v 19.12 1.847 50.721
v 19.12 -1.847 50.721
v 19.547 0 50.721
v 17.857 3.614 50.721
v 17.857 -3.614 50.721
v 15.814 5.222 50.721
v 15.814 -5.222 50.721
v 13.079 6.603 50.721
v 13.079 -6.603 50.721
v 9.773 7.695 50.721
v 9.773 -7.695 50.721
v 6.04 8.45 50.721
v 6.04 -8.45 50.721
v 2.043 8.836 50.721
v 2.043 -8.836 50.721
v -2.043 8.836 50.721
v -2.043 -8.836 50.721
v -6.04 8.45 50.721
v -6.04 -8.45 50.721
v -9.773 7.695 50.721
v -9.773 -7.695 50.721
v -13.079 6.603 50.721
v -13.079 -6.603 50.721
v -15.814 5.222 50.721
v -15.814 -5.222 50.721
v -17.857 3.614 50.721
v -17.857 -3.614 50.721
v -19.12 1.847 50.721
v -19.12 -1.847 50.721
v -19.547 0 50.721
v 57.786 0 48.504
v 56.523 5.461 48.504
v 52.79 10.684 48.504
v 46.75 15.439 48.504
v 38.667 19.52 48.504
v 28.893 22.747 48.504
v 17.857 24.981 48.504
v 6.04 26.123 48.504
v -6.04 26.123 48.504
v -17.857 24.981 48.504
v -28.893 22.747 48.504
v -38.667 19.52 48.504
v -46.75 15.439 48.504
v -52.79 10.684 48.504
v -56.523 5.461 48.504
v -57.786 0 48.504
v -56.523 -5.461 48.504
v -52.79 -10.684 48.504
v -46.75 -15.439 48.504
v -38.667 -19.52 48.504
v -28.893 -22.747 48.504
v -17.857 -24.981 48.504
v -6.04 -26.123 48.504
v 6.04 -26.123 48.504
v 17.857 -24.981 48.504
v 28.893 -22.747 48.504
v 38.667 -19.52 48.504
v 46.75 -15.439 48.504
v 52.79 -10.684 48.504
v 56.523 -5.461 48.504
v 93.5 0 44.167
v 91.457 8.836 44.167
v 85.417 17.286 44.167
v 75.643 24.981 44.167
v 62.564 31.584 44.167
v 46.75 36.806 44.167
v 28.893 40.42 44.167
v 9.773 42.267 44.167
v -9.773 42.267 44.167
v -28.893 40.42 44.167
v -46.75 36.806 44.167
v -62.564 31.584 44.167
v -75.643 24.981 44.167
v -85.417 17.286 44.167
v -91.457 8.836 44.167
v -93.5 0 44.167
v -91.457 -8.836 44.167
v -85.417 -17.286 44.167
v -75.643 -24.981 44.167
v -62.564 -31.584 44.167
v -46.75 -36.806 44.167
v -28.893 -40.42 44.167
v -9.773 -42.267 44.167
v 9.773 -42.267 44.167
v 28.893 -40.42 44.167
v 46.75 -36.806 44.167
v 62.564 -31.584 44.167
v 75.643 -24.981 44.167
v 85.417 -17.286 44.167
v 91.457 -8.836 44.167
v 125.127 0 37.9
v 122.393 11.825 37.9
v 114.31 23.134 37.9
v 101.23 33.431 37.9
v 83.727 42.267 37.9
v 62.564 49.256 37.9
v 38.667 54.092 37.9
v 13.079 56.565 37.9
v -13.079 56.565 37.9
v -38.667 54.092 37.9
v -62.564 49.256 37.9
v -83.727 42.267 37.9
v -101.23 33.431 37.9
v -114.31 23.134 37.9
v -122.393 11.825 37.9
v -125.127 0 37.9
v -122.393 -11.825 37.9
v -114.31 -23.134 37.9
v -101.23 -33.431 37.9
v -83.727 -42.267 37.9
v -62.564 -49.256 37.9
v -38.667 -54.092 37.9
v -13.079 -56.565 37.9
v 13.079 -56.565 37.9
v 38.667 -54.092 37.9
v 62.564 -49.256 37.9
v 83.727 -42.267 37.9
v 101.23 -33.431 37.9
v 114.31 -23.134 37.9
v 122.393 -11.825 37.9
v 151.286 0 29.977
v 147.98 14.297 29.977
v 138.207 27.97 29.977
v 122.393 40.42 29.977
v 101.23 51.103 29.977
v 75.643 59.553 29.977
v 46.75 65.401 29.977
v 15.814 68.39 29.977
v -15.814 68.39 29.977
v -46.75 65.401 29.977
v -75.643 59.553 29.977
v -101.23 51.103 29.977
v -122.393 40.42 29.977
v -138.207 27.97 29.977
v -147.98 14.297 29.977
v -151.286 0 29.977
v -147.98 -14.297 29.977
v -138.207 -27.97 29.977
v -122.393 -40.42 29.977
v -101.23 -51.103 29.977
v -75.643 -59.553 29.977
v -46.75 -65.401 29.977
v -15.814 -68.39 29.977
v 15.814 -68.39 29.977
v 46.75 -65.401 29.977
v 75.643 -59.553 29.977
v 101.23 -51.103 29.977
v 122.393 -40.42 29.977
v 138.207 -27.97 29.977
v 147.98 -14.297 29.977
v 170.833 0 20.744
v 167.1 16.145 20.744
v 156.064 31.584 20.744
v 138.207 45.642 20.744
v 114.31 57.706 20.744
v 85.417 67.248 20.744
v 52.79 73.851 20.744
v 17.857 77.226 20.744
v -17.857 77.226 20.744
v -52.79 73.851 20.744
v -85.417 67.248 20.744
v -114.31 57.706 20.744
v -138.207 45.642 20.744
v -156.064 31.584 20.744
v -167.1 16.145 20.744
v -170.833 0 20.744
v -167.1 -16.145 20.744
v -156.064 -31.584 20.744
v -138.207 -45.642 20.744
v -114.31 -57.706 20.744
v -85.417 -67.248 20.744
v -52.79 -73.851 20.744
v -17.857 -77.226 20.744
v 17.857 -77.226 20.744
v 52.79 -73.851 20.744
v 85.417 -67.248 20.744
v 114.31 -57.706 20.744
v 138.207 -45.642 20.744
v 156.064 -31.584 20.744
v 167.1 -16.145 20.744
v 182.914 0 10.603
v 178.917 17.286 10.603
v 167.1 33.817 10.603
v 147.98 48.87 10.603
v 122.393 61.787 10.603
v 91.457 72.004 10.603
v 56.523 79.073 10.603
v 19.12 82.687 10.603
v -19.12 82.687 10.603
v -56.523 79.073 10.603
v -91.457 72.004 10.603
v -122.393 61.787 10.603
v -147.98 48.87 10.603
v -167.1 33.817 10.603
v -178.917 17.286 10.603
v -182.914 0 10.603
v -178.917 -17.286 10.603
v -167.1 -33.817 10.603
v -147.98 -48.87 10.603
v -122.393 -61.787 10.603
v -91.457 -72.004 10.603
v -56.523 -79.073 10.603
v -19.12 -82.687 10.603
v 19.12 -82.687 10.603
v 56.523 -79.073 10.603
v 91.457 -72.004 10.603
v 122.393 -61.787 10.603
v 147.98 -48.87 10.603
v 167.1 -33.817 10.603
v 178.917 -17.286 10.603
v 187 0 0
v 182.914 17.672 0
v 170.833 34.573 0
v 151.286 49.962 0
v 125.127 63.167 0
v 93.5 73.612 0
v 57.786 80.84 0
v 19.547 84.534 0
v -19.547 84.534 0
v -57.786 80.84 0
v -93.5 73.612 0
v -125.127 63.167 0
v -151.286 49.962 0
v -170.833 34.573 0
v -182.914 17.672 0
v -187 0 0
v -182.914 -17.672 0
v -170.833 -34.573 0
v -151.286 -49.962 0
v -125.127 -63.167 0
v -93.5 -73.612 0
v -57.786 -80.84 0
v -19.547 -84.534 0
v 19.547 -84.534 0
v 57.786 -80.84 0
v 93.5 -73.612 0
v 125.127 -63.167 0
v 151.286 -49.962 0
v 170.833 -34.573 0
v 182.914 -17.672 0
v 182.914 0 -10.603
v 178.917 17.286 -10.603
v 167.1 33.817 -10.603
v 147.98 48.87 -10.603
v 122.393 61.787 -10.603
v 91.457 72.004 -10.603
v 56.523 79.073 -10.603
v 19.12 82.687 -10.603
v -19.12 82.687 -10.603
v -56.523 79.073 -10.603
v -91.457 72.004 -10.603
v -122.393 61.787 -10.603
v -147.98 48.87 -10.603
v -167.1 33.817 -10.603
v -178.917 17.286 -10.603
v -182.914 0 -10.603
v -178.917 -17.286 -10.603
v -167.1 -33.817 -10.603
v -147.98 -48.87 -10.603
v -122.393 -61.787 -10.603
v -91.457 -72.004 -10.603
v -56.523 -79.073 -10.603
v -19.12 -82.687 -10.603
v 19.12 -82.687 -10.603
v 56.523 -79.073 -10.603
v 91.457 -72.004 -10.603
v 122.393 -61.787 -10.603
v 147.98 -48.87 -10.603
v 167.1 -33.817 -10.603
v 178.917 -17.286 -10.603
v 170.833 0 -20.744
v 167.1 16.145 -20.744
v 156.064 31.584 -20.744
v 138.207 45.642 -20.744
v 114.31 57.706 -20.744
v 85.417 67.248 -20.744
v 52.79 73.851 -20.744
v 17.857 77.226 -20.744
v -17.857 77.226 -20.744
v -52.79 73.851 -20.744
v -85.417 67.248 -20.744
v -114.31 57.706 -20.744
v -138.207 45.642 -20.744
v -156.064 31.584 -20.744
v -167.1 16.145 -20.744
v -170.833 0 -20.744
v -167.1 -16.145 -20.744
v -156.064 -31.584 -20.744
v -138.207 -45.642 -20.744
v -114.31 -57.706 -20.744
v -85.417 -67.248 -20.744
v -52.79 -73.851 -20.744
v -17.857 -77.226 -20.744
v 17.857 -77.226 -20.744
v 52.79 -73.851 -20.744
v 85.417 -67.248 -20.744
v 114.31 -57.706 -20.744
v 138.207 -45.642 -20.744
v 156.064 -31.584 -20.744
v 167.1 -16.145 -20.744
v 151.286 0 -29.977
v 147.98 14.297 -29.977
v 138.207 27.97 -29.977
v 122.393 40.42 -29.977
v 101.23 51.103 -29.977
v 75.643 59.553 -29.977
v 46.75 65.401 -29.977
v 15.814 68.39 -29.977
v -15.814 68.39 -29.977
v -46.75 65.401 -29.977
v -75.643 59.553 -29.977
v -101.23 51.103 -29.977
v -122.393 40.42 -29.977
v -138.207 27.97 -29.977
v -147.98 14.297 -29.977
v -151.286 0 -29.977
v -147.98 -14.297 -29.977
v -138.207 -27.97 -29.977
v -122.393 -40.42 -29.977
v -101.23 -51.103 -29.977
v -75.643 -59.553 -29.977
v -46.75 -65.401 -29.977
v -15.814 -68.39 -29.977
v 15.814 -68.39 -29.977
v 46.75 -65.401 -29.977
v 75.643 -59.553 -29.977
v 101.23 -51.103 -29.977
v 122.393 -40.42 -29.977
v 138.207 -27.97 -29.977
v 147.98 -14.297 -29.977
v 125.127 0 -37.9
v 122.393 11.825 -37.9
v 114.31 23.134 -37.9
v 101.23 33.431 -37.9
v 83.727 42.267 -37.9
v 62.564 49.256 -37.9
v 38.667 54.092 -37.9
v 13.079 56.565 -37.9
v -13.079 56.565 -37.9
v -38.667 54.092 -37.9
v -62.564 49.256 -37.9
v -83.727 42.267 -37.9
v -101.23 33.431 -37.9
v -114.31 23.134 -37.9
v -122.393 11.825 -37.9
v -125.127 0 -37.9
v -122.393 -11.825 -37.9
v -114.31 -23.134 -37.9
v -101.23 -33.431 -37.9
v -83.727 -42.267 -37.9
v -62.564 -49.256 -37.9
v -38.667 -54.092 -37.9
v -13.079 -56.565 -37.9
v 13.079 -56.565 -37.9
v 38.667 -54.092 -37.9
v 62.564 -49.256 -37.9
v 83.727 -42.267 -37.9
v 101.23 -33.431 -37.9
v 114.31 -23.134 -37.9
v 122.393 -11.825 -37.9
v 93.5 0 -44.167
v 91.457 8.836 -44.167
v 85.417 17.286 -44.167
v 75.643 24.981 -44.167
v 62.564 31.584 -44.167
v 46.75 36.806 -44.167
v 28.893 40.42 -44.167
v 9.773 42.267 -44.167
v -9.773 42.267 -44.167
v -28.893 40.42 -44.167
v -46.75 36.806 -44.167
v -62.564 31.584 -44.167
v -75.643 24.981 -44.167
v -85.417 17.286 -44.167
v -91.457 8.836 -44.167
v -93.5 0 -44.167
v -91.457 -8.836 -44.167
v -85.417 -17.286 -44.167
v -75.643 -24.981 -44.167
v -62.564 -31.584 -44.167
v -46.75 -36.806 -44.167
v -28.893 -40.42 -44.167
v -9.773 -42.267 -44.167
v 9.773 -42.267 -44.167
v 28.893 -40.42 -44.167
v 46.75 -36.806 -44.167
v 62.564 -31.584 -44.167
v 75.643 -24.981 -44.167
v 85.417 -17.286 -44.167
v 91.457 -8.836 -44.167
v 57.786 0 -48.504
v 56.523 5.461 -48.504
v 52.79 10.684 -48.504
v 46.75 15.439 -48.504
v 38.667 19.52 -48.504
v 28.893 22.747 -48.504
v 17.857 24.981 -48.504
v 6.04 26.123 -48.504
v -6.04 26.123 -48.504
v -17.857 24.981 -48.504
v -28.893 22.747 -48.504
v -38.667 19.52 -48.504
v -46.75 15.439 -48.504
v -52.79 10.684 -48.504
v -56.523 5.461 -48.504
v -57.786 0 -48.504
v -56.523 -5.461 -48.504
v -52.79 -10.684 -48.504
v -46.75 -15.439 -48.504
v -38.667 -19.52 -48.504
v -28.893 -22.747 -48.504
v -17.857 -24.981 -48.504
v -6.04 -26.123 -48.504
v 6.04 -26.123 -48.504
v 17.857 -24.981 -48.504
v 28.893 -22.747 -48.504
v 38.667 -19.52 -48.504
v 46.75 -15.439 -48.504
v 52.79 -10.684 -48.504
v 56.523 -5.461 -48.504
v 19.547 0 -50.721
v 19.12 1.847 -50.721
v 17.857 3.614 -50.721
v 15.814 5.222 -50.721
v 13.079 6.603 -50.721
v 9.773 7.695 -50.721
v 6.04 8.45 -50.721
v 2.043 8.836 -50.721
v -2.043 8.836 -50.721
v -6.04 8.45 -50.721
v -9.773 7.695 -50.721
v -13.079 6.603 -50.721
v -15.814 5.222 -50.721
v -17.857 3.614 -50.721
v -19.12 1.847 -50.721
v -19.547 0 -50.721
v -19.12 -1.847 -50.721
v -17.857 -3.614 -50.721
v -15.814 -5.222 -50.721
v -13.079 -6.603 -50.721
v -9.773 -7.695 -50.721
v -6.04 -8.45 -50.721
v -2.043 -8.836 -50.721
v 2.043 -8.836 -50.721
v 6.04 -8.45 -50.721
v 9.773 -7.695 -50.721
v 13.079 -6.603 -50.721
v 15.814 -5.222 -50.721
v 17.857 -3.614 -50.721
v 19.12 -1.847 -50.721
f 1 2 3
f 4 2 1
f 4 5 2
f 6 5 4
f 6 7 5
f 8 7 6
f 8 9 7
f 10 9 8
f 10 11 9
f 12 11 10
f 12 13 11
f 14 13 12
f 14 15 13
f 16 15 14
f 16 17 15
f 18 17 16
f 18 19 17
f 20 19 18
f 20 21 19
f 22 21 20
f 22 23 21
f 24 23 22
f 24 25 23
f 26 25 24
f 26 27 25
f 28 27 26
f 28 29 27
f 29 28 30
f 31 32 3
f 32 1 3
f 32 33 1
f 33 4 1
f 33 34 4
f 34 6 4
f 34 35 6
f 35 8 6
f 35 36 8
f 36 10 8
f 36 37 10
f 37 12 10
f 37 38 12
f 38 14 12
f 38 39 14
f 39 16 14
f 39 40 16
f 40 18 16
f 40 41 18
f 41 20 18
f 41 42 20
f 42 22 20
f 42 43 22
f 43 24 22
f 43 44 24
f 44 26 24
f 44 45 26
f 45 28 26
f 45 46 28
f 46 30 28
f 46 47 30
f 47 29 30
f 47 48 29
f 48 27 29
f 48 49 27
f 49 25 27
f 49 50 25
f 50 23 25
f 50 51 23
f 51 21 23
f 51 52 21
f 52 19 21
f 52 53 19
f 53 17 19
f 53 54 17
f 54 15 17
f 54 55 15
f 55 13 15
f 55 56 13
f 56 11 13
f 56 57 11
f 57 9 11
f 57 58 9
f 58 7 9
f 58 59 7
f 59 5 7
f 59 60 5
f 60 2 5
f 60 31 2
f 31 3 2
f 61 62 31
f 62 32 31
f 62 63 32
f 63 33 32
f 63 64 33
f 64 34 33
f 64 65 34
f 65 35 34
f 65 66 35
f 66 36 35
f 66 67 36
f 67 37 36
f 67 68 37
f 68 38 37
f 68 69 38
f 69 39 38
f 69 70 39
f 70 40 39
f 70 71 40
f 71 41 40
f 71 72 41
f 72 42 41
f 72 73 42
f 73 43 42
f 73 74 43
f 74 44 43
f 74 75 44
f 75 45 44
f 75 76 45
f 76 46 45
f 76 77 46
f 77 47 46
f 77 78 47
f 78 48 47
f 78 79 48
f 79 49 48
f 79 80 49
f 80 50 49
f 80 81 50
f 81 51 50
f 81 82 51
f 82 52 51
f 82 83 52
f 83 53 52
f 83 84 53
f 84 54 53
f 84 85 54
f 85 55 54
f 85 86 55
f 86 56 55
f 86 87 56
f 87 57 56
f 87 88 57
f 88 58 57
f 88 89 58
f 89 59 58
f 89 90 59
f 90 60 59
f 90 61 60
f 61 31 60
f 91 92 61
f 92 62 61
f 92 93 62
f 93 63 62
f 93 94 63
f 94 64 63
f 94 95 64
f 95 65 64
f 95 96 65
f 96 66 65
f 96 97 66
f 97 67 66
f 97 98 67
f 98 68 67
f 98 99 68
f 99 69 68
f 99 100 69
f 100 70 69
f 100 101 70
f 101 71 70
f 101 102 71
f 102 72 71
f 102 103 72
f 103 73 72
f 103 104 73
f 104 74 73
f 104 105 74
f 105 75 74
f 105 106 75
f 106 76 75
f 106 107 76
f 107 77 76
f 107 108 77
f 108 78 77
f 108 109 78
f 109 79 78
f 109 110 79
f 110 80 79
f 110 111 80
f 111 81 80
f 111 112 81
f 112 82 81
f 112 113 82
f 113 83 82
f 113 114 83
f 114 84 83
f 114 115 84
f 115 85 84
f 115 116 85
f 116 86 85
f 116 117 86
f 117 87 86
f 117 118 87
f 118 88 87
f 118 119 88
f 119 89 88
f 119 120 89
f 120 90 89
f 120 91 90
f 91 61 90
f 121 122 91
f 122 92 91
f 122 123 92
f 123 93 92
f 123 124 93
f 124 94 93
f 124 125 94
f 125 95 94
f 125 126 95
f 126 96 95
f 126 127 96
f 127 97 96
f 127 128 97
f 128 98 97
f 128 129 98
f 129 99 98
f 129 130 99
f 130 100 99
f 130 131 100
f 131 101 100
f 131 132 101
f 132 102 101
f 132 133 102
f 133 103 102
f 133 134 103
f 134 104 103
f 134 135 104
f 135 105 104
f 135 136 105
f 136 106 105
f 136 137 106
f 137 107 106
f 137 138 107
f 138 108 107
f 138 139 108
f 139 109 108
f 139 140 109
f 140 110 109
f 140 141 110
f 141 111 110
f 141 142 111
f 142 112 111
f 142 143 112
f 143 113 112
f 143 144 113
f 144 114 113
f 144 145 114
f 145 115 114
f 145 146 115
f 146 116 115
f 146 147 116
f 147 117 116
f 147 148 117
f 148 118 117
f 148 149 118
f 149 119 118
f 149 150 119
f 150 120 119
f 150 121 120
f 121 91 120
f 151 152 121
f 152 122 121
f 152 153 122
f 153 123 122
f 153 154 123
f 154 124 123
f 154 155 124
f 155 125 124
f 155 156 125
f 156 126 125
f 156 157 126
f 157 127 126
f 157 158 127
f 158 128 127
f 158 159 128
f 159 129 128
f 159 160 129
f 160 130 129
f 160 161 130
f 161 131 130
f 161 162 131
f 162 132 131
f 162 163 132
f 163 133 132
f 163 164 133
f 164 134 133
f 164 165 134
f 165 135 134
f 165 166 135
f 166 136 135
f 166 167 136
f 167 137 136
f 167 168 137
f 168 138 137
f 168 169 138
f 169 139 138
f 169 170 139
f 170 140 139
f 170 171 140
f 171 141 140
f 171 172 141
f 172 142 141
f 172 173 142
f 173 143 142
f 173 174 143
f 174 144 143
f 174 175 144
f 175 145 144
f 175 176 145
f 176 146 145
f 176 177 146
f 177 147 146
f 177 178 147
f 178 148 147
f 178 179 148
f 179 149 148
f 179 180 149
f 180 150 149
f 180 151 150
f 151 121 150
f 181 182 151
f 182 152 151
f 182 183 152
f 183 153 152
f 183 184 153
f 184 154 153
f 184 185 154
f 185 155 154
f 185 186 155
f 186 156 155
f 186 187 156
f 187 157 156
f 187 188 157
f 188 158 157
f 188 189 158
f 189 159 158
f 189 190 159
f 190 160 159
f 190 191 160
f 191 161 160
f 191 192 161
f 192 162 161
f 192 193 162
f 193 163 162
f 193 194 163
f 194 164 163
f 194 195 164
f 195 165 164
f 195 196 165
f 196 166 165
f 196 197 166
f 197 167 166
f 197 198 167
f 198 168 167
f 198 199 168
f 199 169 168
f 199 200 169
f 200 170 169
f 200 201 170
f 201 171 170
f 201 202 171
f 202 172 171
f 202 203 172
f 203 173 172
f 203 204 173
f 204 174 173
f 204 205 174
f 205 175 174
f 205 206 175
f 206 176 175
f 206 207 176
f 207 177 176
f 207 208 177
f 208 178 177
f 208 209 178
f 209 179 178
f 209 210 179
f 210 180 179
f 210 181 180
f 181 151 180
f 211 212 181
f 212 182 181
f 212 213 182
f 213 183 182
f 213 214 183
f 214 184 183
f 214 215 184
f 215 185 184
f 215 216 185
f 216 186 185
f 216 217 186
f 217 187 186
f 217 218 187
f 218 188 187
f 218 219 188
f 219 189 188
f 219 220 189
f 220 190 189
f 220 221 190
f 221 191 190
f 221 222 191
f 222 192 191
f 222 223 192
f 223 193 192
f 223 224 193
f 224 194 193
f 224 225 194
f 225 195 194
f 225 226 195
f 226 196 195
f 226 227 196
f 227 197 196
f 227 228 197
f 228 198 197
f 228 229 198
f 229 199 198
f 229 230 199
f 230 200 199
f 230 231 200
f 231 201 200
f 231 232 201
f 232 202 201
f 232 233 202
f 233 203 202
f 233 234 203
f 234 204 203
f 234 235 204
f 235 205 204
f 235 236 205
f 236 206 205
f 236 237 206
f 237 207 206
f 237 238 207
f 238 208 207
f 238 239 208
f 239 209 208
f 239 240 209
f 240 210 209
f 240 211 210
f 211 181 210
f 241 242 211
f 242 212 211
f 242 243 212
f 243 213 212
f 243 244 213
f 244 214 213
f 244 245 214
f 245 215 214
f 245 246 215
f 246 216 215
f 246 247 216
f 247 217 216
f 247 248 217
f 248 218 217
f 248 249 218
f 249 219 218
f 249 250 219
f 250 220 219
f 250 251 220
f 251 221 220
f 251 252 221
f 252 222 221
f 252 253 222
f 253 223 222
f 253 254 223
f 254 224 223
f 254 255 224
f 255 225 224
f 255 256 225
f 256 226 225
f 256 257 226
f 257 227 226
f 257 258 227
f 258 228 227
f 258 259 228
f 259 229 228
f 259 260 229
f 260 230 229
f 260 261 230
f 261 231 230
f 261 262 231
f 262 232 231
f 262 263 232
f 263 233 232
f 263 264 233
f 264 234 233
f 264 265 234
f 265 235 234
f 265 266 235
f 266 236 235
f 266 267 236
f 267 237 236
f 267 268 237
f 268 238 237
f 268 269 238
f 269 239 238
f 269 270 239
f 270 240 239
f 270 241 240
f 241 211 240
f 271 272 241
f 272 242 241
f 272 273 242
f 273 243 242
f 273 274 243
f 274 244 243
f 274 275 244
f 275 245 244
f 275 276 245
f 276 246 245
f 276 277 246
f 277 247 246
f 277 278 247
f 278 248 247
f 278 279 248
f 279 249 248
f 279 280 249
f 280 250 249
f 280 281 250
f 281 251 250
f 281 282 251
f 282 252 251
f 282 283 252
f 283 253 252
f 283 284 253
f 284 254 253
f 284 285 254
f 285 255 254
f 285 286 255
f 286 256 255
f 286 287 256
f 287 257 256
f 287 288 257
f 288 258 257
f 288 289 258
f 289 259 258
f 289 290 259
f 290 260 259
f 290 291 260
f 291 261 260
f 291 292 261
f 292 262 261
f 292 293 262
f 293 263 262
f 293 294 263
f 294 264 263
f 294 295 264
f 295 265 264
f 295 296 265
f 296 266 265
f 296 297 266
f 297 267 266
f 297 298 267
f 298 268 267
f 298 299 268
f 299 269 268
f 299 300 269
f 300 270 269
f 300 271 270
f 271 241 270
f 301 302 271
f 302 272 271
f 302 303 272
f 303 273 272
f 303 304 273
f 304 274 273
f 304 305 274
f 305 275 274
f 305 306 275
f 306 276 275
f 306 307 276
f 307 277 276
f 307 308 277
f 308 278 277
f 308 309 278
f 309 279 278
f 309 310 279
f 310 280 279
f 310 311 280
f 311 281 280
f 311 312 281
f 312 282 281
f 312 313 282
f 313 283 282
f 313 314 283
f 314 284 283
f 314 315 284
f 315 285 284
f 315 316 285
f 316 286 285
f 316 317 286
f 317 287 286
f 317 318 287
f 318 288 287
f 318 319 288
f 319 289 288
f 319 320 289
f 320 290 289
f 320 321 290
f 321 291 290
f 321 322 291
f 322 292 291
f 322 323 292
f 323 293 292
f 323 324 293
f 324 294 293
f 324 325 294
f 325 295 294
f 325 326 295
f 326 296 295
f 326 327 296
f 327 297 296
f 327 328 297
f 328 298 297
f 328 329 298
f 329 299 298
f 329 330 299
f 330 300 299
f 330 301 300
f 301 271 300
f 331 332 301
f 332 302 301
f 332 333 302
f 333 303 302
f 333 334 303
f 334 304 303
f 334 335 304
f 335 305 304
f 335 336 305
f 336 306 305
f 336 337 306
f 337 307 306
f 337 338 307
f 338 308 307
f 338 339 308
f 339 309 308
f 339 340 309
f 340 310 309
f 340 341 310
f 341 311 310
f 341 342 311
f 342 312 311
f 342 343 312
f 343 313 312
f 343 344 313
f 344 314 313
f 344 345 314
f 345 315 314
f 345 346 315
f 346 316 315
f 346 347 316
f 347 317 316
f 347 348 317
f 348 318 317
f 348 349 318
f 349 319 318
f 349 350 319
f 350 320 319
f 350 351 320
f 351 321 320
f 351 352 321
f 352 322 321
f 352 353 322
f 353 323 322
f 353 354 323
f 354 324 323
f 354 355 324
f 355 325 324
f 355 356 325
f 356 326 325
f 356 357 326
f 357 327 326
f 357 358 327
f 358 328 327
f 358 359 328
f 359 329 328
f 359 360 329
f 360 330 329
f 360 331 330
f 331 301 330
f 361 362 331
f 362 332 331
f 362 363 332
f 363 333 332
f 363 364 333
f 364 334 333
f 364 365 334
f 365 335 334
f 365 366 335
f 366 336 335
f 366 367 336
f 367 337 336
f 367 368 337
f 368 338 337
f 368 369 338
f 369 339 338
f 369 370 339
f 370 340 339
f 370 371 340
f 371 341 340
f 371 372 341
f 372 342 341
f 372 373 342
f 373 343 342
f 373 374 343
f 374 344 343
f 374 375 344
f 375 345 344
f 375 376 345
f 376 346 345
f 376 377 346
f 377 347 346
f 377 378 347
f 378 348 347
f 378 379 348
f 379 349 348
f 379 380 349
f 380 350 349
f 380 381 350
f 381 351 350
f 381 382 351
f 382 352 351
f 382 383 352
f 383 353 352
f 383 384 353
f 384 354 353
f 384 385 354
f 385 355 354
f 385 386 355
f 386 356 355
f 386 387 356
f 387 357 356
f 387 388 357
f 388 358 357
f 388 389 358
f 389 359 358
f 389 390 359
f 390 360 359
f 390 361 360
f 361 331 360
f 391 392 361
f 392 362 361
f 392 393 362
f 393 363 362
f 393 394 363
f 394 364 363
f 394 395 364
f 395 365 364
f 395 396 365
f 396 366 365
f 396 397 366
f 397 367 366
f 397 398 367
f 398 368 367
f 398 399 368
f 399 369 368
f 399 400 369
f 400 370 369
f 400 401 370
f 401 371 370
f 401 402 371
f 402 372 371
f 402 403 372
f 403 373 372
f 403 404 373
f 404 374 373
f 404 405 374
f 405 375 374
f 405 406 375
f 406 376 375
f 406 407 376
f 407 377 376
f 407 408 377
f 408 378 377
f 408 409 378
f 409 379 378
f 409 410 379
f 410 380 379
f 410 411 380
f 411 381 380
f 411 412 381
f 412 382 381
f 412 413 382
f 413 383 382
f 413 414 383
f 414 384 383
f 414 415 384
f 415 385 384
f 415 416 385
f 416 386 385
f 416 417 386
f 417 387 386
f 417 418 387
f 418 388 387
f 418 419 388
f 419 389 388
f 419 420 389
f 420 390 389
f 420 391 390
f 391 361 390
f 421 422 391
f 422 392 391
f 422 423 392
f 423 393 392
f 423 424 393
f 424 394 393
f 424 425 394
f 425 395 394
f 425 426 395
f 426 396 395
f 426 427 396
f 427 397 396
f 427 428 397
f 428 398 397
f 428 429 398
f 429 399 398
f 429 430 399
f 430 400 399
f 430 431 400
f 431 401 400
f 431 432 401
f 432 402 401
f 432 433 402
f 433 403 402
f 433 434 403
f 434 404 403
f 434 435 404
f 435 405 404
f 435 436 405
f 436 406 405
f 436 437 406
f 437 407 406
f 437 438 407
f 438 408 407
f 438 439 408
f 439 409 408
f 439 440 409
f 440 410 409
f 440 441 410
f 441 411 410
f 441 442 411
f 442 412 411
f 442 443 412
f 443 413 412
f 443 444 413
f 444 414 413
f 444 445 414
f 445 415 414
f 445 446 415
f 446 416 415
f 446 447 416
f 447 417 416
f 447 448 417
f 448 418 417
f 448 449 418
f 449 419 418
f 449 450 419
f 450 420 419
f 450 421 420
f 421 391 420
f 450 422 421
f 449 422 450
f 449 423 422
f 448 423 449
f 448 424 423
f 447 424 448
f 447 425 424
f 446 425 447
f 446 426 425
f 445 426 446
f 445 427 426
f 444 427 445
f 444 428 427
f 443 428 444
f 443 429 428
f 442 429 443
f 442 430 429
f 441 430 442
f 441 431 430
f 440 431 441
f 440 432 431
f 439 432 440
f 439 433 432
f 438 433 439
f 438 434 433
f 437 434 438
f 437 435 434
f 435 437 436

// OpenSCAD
// Generated by SolidPython 1.0.1 on 2020-07-29 00:46:49


scale(v = [11, 5, 3]) {
	sphere(r = 17);
}
/***********************************************
*********      SolidPython code:      **********
************************************************
 
# import packages: SolidPython
from solid import *
from solid.utils import *
from itertools import chain, combinations, permutations


class Resize:

    def __init__(self, scad_file):
        self.scad_file = scad_file
        #self.scad_file = import_scad(scad_file)
        # cone/cylinder param:
        self.r1 = 0
        self.r2 = 0
        self.h = 0
        # rectangular prism param:
        self.w = 0
        self.l = 0
        # ellipse param:
        self.r = 0

    # import OpenScad code (file name corresponds to shape)


    # classify shape + parameters
    def assign(self, param1, param2, param3):
        if self.scad_file == 'cone.scad':
            self.r1 = param1
            self.r2 = param2
            self.h = param3
        elif self.scad_file == 'cylinder.scad':
            self.r1 = param1
            self.r2 = param2
            self.h = param3
        elif self.scad_file == 'rectangularPrism.scad':
            self.h = param1
            self.l = param2
            self.w = param3
        else:
            self.r = param1
            self.h = param2

    # resize parameters
    def iterate(self):
        x = range(3, 20, 2)
        i = 1
        if self.scad_file == 'cone.scad':
            tempList = list(permutations(x, 2))
            for temp in tempList:
                param1 = temp[0]
                param2 = temp[1]
                filepath = 'produced_scad_files/' + 'cone' + str(param1) + '_' + str(param2) + '_' + '.scad'
                scad_render_to_file(cylinder(h=param1, r1=param2, r2=0), filepath)

        elif self.scad_file == 'cylinder.scad':
            tempList = list(permutations(x, 3))
            for temp in tempList:
                param1 = temp[0]
                param2 = temp[1]
                filepath = 'produced_scad_files/' + 'cylinder' + str(param1) + '_' + str(param2) + '_' + '.scad'
                scad_render_to_file(cylinder(h=param1, r1=param2, r2=param2), filepath)

        elif self.scad_file == 'rectangularPrism.scad':
            tempList = list(permutations(x, 3))
            for temp in tempList:
                param1 = temp[0]
                param2 = temp[1]
                param3 = temp[2]
                filepath = 'produced_scad_files/' + 'rectangularPrism' + str(param1) + '_' + str(param2) + '_' + str(
                    param3) + '.scad'
                scad_render_to_file(cube(size=(param1, param2, param3)), filepath)

        elif self.scad_file == 'ellipse.scad':
            tempList = list(permutations(x, 4))
            for temp in tempList:
                param1 = temp[0]
                param2 = temp[1]
                param3 = temp[2]
                param4 = temp[3]
                filepath = 'produced_scad_files/' + 'ellipse' + str(param1) + '_' + str(param2) + '_' + str(param3) + '_' + str(param4) + '.scad'
                scad_render_to_file(scale([param1, param2, param3])(sphere(r=param4)), filepath)

    def render_to_scadfile(self):
        scad_render_to_file(scad, 'example.scad') 
 
************************************************/
